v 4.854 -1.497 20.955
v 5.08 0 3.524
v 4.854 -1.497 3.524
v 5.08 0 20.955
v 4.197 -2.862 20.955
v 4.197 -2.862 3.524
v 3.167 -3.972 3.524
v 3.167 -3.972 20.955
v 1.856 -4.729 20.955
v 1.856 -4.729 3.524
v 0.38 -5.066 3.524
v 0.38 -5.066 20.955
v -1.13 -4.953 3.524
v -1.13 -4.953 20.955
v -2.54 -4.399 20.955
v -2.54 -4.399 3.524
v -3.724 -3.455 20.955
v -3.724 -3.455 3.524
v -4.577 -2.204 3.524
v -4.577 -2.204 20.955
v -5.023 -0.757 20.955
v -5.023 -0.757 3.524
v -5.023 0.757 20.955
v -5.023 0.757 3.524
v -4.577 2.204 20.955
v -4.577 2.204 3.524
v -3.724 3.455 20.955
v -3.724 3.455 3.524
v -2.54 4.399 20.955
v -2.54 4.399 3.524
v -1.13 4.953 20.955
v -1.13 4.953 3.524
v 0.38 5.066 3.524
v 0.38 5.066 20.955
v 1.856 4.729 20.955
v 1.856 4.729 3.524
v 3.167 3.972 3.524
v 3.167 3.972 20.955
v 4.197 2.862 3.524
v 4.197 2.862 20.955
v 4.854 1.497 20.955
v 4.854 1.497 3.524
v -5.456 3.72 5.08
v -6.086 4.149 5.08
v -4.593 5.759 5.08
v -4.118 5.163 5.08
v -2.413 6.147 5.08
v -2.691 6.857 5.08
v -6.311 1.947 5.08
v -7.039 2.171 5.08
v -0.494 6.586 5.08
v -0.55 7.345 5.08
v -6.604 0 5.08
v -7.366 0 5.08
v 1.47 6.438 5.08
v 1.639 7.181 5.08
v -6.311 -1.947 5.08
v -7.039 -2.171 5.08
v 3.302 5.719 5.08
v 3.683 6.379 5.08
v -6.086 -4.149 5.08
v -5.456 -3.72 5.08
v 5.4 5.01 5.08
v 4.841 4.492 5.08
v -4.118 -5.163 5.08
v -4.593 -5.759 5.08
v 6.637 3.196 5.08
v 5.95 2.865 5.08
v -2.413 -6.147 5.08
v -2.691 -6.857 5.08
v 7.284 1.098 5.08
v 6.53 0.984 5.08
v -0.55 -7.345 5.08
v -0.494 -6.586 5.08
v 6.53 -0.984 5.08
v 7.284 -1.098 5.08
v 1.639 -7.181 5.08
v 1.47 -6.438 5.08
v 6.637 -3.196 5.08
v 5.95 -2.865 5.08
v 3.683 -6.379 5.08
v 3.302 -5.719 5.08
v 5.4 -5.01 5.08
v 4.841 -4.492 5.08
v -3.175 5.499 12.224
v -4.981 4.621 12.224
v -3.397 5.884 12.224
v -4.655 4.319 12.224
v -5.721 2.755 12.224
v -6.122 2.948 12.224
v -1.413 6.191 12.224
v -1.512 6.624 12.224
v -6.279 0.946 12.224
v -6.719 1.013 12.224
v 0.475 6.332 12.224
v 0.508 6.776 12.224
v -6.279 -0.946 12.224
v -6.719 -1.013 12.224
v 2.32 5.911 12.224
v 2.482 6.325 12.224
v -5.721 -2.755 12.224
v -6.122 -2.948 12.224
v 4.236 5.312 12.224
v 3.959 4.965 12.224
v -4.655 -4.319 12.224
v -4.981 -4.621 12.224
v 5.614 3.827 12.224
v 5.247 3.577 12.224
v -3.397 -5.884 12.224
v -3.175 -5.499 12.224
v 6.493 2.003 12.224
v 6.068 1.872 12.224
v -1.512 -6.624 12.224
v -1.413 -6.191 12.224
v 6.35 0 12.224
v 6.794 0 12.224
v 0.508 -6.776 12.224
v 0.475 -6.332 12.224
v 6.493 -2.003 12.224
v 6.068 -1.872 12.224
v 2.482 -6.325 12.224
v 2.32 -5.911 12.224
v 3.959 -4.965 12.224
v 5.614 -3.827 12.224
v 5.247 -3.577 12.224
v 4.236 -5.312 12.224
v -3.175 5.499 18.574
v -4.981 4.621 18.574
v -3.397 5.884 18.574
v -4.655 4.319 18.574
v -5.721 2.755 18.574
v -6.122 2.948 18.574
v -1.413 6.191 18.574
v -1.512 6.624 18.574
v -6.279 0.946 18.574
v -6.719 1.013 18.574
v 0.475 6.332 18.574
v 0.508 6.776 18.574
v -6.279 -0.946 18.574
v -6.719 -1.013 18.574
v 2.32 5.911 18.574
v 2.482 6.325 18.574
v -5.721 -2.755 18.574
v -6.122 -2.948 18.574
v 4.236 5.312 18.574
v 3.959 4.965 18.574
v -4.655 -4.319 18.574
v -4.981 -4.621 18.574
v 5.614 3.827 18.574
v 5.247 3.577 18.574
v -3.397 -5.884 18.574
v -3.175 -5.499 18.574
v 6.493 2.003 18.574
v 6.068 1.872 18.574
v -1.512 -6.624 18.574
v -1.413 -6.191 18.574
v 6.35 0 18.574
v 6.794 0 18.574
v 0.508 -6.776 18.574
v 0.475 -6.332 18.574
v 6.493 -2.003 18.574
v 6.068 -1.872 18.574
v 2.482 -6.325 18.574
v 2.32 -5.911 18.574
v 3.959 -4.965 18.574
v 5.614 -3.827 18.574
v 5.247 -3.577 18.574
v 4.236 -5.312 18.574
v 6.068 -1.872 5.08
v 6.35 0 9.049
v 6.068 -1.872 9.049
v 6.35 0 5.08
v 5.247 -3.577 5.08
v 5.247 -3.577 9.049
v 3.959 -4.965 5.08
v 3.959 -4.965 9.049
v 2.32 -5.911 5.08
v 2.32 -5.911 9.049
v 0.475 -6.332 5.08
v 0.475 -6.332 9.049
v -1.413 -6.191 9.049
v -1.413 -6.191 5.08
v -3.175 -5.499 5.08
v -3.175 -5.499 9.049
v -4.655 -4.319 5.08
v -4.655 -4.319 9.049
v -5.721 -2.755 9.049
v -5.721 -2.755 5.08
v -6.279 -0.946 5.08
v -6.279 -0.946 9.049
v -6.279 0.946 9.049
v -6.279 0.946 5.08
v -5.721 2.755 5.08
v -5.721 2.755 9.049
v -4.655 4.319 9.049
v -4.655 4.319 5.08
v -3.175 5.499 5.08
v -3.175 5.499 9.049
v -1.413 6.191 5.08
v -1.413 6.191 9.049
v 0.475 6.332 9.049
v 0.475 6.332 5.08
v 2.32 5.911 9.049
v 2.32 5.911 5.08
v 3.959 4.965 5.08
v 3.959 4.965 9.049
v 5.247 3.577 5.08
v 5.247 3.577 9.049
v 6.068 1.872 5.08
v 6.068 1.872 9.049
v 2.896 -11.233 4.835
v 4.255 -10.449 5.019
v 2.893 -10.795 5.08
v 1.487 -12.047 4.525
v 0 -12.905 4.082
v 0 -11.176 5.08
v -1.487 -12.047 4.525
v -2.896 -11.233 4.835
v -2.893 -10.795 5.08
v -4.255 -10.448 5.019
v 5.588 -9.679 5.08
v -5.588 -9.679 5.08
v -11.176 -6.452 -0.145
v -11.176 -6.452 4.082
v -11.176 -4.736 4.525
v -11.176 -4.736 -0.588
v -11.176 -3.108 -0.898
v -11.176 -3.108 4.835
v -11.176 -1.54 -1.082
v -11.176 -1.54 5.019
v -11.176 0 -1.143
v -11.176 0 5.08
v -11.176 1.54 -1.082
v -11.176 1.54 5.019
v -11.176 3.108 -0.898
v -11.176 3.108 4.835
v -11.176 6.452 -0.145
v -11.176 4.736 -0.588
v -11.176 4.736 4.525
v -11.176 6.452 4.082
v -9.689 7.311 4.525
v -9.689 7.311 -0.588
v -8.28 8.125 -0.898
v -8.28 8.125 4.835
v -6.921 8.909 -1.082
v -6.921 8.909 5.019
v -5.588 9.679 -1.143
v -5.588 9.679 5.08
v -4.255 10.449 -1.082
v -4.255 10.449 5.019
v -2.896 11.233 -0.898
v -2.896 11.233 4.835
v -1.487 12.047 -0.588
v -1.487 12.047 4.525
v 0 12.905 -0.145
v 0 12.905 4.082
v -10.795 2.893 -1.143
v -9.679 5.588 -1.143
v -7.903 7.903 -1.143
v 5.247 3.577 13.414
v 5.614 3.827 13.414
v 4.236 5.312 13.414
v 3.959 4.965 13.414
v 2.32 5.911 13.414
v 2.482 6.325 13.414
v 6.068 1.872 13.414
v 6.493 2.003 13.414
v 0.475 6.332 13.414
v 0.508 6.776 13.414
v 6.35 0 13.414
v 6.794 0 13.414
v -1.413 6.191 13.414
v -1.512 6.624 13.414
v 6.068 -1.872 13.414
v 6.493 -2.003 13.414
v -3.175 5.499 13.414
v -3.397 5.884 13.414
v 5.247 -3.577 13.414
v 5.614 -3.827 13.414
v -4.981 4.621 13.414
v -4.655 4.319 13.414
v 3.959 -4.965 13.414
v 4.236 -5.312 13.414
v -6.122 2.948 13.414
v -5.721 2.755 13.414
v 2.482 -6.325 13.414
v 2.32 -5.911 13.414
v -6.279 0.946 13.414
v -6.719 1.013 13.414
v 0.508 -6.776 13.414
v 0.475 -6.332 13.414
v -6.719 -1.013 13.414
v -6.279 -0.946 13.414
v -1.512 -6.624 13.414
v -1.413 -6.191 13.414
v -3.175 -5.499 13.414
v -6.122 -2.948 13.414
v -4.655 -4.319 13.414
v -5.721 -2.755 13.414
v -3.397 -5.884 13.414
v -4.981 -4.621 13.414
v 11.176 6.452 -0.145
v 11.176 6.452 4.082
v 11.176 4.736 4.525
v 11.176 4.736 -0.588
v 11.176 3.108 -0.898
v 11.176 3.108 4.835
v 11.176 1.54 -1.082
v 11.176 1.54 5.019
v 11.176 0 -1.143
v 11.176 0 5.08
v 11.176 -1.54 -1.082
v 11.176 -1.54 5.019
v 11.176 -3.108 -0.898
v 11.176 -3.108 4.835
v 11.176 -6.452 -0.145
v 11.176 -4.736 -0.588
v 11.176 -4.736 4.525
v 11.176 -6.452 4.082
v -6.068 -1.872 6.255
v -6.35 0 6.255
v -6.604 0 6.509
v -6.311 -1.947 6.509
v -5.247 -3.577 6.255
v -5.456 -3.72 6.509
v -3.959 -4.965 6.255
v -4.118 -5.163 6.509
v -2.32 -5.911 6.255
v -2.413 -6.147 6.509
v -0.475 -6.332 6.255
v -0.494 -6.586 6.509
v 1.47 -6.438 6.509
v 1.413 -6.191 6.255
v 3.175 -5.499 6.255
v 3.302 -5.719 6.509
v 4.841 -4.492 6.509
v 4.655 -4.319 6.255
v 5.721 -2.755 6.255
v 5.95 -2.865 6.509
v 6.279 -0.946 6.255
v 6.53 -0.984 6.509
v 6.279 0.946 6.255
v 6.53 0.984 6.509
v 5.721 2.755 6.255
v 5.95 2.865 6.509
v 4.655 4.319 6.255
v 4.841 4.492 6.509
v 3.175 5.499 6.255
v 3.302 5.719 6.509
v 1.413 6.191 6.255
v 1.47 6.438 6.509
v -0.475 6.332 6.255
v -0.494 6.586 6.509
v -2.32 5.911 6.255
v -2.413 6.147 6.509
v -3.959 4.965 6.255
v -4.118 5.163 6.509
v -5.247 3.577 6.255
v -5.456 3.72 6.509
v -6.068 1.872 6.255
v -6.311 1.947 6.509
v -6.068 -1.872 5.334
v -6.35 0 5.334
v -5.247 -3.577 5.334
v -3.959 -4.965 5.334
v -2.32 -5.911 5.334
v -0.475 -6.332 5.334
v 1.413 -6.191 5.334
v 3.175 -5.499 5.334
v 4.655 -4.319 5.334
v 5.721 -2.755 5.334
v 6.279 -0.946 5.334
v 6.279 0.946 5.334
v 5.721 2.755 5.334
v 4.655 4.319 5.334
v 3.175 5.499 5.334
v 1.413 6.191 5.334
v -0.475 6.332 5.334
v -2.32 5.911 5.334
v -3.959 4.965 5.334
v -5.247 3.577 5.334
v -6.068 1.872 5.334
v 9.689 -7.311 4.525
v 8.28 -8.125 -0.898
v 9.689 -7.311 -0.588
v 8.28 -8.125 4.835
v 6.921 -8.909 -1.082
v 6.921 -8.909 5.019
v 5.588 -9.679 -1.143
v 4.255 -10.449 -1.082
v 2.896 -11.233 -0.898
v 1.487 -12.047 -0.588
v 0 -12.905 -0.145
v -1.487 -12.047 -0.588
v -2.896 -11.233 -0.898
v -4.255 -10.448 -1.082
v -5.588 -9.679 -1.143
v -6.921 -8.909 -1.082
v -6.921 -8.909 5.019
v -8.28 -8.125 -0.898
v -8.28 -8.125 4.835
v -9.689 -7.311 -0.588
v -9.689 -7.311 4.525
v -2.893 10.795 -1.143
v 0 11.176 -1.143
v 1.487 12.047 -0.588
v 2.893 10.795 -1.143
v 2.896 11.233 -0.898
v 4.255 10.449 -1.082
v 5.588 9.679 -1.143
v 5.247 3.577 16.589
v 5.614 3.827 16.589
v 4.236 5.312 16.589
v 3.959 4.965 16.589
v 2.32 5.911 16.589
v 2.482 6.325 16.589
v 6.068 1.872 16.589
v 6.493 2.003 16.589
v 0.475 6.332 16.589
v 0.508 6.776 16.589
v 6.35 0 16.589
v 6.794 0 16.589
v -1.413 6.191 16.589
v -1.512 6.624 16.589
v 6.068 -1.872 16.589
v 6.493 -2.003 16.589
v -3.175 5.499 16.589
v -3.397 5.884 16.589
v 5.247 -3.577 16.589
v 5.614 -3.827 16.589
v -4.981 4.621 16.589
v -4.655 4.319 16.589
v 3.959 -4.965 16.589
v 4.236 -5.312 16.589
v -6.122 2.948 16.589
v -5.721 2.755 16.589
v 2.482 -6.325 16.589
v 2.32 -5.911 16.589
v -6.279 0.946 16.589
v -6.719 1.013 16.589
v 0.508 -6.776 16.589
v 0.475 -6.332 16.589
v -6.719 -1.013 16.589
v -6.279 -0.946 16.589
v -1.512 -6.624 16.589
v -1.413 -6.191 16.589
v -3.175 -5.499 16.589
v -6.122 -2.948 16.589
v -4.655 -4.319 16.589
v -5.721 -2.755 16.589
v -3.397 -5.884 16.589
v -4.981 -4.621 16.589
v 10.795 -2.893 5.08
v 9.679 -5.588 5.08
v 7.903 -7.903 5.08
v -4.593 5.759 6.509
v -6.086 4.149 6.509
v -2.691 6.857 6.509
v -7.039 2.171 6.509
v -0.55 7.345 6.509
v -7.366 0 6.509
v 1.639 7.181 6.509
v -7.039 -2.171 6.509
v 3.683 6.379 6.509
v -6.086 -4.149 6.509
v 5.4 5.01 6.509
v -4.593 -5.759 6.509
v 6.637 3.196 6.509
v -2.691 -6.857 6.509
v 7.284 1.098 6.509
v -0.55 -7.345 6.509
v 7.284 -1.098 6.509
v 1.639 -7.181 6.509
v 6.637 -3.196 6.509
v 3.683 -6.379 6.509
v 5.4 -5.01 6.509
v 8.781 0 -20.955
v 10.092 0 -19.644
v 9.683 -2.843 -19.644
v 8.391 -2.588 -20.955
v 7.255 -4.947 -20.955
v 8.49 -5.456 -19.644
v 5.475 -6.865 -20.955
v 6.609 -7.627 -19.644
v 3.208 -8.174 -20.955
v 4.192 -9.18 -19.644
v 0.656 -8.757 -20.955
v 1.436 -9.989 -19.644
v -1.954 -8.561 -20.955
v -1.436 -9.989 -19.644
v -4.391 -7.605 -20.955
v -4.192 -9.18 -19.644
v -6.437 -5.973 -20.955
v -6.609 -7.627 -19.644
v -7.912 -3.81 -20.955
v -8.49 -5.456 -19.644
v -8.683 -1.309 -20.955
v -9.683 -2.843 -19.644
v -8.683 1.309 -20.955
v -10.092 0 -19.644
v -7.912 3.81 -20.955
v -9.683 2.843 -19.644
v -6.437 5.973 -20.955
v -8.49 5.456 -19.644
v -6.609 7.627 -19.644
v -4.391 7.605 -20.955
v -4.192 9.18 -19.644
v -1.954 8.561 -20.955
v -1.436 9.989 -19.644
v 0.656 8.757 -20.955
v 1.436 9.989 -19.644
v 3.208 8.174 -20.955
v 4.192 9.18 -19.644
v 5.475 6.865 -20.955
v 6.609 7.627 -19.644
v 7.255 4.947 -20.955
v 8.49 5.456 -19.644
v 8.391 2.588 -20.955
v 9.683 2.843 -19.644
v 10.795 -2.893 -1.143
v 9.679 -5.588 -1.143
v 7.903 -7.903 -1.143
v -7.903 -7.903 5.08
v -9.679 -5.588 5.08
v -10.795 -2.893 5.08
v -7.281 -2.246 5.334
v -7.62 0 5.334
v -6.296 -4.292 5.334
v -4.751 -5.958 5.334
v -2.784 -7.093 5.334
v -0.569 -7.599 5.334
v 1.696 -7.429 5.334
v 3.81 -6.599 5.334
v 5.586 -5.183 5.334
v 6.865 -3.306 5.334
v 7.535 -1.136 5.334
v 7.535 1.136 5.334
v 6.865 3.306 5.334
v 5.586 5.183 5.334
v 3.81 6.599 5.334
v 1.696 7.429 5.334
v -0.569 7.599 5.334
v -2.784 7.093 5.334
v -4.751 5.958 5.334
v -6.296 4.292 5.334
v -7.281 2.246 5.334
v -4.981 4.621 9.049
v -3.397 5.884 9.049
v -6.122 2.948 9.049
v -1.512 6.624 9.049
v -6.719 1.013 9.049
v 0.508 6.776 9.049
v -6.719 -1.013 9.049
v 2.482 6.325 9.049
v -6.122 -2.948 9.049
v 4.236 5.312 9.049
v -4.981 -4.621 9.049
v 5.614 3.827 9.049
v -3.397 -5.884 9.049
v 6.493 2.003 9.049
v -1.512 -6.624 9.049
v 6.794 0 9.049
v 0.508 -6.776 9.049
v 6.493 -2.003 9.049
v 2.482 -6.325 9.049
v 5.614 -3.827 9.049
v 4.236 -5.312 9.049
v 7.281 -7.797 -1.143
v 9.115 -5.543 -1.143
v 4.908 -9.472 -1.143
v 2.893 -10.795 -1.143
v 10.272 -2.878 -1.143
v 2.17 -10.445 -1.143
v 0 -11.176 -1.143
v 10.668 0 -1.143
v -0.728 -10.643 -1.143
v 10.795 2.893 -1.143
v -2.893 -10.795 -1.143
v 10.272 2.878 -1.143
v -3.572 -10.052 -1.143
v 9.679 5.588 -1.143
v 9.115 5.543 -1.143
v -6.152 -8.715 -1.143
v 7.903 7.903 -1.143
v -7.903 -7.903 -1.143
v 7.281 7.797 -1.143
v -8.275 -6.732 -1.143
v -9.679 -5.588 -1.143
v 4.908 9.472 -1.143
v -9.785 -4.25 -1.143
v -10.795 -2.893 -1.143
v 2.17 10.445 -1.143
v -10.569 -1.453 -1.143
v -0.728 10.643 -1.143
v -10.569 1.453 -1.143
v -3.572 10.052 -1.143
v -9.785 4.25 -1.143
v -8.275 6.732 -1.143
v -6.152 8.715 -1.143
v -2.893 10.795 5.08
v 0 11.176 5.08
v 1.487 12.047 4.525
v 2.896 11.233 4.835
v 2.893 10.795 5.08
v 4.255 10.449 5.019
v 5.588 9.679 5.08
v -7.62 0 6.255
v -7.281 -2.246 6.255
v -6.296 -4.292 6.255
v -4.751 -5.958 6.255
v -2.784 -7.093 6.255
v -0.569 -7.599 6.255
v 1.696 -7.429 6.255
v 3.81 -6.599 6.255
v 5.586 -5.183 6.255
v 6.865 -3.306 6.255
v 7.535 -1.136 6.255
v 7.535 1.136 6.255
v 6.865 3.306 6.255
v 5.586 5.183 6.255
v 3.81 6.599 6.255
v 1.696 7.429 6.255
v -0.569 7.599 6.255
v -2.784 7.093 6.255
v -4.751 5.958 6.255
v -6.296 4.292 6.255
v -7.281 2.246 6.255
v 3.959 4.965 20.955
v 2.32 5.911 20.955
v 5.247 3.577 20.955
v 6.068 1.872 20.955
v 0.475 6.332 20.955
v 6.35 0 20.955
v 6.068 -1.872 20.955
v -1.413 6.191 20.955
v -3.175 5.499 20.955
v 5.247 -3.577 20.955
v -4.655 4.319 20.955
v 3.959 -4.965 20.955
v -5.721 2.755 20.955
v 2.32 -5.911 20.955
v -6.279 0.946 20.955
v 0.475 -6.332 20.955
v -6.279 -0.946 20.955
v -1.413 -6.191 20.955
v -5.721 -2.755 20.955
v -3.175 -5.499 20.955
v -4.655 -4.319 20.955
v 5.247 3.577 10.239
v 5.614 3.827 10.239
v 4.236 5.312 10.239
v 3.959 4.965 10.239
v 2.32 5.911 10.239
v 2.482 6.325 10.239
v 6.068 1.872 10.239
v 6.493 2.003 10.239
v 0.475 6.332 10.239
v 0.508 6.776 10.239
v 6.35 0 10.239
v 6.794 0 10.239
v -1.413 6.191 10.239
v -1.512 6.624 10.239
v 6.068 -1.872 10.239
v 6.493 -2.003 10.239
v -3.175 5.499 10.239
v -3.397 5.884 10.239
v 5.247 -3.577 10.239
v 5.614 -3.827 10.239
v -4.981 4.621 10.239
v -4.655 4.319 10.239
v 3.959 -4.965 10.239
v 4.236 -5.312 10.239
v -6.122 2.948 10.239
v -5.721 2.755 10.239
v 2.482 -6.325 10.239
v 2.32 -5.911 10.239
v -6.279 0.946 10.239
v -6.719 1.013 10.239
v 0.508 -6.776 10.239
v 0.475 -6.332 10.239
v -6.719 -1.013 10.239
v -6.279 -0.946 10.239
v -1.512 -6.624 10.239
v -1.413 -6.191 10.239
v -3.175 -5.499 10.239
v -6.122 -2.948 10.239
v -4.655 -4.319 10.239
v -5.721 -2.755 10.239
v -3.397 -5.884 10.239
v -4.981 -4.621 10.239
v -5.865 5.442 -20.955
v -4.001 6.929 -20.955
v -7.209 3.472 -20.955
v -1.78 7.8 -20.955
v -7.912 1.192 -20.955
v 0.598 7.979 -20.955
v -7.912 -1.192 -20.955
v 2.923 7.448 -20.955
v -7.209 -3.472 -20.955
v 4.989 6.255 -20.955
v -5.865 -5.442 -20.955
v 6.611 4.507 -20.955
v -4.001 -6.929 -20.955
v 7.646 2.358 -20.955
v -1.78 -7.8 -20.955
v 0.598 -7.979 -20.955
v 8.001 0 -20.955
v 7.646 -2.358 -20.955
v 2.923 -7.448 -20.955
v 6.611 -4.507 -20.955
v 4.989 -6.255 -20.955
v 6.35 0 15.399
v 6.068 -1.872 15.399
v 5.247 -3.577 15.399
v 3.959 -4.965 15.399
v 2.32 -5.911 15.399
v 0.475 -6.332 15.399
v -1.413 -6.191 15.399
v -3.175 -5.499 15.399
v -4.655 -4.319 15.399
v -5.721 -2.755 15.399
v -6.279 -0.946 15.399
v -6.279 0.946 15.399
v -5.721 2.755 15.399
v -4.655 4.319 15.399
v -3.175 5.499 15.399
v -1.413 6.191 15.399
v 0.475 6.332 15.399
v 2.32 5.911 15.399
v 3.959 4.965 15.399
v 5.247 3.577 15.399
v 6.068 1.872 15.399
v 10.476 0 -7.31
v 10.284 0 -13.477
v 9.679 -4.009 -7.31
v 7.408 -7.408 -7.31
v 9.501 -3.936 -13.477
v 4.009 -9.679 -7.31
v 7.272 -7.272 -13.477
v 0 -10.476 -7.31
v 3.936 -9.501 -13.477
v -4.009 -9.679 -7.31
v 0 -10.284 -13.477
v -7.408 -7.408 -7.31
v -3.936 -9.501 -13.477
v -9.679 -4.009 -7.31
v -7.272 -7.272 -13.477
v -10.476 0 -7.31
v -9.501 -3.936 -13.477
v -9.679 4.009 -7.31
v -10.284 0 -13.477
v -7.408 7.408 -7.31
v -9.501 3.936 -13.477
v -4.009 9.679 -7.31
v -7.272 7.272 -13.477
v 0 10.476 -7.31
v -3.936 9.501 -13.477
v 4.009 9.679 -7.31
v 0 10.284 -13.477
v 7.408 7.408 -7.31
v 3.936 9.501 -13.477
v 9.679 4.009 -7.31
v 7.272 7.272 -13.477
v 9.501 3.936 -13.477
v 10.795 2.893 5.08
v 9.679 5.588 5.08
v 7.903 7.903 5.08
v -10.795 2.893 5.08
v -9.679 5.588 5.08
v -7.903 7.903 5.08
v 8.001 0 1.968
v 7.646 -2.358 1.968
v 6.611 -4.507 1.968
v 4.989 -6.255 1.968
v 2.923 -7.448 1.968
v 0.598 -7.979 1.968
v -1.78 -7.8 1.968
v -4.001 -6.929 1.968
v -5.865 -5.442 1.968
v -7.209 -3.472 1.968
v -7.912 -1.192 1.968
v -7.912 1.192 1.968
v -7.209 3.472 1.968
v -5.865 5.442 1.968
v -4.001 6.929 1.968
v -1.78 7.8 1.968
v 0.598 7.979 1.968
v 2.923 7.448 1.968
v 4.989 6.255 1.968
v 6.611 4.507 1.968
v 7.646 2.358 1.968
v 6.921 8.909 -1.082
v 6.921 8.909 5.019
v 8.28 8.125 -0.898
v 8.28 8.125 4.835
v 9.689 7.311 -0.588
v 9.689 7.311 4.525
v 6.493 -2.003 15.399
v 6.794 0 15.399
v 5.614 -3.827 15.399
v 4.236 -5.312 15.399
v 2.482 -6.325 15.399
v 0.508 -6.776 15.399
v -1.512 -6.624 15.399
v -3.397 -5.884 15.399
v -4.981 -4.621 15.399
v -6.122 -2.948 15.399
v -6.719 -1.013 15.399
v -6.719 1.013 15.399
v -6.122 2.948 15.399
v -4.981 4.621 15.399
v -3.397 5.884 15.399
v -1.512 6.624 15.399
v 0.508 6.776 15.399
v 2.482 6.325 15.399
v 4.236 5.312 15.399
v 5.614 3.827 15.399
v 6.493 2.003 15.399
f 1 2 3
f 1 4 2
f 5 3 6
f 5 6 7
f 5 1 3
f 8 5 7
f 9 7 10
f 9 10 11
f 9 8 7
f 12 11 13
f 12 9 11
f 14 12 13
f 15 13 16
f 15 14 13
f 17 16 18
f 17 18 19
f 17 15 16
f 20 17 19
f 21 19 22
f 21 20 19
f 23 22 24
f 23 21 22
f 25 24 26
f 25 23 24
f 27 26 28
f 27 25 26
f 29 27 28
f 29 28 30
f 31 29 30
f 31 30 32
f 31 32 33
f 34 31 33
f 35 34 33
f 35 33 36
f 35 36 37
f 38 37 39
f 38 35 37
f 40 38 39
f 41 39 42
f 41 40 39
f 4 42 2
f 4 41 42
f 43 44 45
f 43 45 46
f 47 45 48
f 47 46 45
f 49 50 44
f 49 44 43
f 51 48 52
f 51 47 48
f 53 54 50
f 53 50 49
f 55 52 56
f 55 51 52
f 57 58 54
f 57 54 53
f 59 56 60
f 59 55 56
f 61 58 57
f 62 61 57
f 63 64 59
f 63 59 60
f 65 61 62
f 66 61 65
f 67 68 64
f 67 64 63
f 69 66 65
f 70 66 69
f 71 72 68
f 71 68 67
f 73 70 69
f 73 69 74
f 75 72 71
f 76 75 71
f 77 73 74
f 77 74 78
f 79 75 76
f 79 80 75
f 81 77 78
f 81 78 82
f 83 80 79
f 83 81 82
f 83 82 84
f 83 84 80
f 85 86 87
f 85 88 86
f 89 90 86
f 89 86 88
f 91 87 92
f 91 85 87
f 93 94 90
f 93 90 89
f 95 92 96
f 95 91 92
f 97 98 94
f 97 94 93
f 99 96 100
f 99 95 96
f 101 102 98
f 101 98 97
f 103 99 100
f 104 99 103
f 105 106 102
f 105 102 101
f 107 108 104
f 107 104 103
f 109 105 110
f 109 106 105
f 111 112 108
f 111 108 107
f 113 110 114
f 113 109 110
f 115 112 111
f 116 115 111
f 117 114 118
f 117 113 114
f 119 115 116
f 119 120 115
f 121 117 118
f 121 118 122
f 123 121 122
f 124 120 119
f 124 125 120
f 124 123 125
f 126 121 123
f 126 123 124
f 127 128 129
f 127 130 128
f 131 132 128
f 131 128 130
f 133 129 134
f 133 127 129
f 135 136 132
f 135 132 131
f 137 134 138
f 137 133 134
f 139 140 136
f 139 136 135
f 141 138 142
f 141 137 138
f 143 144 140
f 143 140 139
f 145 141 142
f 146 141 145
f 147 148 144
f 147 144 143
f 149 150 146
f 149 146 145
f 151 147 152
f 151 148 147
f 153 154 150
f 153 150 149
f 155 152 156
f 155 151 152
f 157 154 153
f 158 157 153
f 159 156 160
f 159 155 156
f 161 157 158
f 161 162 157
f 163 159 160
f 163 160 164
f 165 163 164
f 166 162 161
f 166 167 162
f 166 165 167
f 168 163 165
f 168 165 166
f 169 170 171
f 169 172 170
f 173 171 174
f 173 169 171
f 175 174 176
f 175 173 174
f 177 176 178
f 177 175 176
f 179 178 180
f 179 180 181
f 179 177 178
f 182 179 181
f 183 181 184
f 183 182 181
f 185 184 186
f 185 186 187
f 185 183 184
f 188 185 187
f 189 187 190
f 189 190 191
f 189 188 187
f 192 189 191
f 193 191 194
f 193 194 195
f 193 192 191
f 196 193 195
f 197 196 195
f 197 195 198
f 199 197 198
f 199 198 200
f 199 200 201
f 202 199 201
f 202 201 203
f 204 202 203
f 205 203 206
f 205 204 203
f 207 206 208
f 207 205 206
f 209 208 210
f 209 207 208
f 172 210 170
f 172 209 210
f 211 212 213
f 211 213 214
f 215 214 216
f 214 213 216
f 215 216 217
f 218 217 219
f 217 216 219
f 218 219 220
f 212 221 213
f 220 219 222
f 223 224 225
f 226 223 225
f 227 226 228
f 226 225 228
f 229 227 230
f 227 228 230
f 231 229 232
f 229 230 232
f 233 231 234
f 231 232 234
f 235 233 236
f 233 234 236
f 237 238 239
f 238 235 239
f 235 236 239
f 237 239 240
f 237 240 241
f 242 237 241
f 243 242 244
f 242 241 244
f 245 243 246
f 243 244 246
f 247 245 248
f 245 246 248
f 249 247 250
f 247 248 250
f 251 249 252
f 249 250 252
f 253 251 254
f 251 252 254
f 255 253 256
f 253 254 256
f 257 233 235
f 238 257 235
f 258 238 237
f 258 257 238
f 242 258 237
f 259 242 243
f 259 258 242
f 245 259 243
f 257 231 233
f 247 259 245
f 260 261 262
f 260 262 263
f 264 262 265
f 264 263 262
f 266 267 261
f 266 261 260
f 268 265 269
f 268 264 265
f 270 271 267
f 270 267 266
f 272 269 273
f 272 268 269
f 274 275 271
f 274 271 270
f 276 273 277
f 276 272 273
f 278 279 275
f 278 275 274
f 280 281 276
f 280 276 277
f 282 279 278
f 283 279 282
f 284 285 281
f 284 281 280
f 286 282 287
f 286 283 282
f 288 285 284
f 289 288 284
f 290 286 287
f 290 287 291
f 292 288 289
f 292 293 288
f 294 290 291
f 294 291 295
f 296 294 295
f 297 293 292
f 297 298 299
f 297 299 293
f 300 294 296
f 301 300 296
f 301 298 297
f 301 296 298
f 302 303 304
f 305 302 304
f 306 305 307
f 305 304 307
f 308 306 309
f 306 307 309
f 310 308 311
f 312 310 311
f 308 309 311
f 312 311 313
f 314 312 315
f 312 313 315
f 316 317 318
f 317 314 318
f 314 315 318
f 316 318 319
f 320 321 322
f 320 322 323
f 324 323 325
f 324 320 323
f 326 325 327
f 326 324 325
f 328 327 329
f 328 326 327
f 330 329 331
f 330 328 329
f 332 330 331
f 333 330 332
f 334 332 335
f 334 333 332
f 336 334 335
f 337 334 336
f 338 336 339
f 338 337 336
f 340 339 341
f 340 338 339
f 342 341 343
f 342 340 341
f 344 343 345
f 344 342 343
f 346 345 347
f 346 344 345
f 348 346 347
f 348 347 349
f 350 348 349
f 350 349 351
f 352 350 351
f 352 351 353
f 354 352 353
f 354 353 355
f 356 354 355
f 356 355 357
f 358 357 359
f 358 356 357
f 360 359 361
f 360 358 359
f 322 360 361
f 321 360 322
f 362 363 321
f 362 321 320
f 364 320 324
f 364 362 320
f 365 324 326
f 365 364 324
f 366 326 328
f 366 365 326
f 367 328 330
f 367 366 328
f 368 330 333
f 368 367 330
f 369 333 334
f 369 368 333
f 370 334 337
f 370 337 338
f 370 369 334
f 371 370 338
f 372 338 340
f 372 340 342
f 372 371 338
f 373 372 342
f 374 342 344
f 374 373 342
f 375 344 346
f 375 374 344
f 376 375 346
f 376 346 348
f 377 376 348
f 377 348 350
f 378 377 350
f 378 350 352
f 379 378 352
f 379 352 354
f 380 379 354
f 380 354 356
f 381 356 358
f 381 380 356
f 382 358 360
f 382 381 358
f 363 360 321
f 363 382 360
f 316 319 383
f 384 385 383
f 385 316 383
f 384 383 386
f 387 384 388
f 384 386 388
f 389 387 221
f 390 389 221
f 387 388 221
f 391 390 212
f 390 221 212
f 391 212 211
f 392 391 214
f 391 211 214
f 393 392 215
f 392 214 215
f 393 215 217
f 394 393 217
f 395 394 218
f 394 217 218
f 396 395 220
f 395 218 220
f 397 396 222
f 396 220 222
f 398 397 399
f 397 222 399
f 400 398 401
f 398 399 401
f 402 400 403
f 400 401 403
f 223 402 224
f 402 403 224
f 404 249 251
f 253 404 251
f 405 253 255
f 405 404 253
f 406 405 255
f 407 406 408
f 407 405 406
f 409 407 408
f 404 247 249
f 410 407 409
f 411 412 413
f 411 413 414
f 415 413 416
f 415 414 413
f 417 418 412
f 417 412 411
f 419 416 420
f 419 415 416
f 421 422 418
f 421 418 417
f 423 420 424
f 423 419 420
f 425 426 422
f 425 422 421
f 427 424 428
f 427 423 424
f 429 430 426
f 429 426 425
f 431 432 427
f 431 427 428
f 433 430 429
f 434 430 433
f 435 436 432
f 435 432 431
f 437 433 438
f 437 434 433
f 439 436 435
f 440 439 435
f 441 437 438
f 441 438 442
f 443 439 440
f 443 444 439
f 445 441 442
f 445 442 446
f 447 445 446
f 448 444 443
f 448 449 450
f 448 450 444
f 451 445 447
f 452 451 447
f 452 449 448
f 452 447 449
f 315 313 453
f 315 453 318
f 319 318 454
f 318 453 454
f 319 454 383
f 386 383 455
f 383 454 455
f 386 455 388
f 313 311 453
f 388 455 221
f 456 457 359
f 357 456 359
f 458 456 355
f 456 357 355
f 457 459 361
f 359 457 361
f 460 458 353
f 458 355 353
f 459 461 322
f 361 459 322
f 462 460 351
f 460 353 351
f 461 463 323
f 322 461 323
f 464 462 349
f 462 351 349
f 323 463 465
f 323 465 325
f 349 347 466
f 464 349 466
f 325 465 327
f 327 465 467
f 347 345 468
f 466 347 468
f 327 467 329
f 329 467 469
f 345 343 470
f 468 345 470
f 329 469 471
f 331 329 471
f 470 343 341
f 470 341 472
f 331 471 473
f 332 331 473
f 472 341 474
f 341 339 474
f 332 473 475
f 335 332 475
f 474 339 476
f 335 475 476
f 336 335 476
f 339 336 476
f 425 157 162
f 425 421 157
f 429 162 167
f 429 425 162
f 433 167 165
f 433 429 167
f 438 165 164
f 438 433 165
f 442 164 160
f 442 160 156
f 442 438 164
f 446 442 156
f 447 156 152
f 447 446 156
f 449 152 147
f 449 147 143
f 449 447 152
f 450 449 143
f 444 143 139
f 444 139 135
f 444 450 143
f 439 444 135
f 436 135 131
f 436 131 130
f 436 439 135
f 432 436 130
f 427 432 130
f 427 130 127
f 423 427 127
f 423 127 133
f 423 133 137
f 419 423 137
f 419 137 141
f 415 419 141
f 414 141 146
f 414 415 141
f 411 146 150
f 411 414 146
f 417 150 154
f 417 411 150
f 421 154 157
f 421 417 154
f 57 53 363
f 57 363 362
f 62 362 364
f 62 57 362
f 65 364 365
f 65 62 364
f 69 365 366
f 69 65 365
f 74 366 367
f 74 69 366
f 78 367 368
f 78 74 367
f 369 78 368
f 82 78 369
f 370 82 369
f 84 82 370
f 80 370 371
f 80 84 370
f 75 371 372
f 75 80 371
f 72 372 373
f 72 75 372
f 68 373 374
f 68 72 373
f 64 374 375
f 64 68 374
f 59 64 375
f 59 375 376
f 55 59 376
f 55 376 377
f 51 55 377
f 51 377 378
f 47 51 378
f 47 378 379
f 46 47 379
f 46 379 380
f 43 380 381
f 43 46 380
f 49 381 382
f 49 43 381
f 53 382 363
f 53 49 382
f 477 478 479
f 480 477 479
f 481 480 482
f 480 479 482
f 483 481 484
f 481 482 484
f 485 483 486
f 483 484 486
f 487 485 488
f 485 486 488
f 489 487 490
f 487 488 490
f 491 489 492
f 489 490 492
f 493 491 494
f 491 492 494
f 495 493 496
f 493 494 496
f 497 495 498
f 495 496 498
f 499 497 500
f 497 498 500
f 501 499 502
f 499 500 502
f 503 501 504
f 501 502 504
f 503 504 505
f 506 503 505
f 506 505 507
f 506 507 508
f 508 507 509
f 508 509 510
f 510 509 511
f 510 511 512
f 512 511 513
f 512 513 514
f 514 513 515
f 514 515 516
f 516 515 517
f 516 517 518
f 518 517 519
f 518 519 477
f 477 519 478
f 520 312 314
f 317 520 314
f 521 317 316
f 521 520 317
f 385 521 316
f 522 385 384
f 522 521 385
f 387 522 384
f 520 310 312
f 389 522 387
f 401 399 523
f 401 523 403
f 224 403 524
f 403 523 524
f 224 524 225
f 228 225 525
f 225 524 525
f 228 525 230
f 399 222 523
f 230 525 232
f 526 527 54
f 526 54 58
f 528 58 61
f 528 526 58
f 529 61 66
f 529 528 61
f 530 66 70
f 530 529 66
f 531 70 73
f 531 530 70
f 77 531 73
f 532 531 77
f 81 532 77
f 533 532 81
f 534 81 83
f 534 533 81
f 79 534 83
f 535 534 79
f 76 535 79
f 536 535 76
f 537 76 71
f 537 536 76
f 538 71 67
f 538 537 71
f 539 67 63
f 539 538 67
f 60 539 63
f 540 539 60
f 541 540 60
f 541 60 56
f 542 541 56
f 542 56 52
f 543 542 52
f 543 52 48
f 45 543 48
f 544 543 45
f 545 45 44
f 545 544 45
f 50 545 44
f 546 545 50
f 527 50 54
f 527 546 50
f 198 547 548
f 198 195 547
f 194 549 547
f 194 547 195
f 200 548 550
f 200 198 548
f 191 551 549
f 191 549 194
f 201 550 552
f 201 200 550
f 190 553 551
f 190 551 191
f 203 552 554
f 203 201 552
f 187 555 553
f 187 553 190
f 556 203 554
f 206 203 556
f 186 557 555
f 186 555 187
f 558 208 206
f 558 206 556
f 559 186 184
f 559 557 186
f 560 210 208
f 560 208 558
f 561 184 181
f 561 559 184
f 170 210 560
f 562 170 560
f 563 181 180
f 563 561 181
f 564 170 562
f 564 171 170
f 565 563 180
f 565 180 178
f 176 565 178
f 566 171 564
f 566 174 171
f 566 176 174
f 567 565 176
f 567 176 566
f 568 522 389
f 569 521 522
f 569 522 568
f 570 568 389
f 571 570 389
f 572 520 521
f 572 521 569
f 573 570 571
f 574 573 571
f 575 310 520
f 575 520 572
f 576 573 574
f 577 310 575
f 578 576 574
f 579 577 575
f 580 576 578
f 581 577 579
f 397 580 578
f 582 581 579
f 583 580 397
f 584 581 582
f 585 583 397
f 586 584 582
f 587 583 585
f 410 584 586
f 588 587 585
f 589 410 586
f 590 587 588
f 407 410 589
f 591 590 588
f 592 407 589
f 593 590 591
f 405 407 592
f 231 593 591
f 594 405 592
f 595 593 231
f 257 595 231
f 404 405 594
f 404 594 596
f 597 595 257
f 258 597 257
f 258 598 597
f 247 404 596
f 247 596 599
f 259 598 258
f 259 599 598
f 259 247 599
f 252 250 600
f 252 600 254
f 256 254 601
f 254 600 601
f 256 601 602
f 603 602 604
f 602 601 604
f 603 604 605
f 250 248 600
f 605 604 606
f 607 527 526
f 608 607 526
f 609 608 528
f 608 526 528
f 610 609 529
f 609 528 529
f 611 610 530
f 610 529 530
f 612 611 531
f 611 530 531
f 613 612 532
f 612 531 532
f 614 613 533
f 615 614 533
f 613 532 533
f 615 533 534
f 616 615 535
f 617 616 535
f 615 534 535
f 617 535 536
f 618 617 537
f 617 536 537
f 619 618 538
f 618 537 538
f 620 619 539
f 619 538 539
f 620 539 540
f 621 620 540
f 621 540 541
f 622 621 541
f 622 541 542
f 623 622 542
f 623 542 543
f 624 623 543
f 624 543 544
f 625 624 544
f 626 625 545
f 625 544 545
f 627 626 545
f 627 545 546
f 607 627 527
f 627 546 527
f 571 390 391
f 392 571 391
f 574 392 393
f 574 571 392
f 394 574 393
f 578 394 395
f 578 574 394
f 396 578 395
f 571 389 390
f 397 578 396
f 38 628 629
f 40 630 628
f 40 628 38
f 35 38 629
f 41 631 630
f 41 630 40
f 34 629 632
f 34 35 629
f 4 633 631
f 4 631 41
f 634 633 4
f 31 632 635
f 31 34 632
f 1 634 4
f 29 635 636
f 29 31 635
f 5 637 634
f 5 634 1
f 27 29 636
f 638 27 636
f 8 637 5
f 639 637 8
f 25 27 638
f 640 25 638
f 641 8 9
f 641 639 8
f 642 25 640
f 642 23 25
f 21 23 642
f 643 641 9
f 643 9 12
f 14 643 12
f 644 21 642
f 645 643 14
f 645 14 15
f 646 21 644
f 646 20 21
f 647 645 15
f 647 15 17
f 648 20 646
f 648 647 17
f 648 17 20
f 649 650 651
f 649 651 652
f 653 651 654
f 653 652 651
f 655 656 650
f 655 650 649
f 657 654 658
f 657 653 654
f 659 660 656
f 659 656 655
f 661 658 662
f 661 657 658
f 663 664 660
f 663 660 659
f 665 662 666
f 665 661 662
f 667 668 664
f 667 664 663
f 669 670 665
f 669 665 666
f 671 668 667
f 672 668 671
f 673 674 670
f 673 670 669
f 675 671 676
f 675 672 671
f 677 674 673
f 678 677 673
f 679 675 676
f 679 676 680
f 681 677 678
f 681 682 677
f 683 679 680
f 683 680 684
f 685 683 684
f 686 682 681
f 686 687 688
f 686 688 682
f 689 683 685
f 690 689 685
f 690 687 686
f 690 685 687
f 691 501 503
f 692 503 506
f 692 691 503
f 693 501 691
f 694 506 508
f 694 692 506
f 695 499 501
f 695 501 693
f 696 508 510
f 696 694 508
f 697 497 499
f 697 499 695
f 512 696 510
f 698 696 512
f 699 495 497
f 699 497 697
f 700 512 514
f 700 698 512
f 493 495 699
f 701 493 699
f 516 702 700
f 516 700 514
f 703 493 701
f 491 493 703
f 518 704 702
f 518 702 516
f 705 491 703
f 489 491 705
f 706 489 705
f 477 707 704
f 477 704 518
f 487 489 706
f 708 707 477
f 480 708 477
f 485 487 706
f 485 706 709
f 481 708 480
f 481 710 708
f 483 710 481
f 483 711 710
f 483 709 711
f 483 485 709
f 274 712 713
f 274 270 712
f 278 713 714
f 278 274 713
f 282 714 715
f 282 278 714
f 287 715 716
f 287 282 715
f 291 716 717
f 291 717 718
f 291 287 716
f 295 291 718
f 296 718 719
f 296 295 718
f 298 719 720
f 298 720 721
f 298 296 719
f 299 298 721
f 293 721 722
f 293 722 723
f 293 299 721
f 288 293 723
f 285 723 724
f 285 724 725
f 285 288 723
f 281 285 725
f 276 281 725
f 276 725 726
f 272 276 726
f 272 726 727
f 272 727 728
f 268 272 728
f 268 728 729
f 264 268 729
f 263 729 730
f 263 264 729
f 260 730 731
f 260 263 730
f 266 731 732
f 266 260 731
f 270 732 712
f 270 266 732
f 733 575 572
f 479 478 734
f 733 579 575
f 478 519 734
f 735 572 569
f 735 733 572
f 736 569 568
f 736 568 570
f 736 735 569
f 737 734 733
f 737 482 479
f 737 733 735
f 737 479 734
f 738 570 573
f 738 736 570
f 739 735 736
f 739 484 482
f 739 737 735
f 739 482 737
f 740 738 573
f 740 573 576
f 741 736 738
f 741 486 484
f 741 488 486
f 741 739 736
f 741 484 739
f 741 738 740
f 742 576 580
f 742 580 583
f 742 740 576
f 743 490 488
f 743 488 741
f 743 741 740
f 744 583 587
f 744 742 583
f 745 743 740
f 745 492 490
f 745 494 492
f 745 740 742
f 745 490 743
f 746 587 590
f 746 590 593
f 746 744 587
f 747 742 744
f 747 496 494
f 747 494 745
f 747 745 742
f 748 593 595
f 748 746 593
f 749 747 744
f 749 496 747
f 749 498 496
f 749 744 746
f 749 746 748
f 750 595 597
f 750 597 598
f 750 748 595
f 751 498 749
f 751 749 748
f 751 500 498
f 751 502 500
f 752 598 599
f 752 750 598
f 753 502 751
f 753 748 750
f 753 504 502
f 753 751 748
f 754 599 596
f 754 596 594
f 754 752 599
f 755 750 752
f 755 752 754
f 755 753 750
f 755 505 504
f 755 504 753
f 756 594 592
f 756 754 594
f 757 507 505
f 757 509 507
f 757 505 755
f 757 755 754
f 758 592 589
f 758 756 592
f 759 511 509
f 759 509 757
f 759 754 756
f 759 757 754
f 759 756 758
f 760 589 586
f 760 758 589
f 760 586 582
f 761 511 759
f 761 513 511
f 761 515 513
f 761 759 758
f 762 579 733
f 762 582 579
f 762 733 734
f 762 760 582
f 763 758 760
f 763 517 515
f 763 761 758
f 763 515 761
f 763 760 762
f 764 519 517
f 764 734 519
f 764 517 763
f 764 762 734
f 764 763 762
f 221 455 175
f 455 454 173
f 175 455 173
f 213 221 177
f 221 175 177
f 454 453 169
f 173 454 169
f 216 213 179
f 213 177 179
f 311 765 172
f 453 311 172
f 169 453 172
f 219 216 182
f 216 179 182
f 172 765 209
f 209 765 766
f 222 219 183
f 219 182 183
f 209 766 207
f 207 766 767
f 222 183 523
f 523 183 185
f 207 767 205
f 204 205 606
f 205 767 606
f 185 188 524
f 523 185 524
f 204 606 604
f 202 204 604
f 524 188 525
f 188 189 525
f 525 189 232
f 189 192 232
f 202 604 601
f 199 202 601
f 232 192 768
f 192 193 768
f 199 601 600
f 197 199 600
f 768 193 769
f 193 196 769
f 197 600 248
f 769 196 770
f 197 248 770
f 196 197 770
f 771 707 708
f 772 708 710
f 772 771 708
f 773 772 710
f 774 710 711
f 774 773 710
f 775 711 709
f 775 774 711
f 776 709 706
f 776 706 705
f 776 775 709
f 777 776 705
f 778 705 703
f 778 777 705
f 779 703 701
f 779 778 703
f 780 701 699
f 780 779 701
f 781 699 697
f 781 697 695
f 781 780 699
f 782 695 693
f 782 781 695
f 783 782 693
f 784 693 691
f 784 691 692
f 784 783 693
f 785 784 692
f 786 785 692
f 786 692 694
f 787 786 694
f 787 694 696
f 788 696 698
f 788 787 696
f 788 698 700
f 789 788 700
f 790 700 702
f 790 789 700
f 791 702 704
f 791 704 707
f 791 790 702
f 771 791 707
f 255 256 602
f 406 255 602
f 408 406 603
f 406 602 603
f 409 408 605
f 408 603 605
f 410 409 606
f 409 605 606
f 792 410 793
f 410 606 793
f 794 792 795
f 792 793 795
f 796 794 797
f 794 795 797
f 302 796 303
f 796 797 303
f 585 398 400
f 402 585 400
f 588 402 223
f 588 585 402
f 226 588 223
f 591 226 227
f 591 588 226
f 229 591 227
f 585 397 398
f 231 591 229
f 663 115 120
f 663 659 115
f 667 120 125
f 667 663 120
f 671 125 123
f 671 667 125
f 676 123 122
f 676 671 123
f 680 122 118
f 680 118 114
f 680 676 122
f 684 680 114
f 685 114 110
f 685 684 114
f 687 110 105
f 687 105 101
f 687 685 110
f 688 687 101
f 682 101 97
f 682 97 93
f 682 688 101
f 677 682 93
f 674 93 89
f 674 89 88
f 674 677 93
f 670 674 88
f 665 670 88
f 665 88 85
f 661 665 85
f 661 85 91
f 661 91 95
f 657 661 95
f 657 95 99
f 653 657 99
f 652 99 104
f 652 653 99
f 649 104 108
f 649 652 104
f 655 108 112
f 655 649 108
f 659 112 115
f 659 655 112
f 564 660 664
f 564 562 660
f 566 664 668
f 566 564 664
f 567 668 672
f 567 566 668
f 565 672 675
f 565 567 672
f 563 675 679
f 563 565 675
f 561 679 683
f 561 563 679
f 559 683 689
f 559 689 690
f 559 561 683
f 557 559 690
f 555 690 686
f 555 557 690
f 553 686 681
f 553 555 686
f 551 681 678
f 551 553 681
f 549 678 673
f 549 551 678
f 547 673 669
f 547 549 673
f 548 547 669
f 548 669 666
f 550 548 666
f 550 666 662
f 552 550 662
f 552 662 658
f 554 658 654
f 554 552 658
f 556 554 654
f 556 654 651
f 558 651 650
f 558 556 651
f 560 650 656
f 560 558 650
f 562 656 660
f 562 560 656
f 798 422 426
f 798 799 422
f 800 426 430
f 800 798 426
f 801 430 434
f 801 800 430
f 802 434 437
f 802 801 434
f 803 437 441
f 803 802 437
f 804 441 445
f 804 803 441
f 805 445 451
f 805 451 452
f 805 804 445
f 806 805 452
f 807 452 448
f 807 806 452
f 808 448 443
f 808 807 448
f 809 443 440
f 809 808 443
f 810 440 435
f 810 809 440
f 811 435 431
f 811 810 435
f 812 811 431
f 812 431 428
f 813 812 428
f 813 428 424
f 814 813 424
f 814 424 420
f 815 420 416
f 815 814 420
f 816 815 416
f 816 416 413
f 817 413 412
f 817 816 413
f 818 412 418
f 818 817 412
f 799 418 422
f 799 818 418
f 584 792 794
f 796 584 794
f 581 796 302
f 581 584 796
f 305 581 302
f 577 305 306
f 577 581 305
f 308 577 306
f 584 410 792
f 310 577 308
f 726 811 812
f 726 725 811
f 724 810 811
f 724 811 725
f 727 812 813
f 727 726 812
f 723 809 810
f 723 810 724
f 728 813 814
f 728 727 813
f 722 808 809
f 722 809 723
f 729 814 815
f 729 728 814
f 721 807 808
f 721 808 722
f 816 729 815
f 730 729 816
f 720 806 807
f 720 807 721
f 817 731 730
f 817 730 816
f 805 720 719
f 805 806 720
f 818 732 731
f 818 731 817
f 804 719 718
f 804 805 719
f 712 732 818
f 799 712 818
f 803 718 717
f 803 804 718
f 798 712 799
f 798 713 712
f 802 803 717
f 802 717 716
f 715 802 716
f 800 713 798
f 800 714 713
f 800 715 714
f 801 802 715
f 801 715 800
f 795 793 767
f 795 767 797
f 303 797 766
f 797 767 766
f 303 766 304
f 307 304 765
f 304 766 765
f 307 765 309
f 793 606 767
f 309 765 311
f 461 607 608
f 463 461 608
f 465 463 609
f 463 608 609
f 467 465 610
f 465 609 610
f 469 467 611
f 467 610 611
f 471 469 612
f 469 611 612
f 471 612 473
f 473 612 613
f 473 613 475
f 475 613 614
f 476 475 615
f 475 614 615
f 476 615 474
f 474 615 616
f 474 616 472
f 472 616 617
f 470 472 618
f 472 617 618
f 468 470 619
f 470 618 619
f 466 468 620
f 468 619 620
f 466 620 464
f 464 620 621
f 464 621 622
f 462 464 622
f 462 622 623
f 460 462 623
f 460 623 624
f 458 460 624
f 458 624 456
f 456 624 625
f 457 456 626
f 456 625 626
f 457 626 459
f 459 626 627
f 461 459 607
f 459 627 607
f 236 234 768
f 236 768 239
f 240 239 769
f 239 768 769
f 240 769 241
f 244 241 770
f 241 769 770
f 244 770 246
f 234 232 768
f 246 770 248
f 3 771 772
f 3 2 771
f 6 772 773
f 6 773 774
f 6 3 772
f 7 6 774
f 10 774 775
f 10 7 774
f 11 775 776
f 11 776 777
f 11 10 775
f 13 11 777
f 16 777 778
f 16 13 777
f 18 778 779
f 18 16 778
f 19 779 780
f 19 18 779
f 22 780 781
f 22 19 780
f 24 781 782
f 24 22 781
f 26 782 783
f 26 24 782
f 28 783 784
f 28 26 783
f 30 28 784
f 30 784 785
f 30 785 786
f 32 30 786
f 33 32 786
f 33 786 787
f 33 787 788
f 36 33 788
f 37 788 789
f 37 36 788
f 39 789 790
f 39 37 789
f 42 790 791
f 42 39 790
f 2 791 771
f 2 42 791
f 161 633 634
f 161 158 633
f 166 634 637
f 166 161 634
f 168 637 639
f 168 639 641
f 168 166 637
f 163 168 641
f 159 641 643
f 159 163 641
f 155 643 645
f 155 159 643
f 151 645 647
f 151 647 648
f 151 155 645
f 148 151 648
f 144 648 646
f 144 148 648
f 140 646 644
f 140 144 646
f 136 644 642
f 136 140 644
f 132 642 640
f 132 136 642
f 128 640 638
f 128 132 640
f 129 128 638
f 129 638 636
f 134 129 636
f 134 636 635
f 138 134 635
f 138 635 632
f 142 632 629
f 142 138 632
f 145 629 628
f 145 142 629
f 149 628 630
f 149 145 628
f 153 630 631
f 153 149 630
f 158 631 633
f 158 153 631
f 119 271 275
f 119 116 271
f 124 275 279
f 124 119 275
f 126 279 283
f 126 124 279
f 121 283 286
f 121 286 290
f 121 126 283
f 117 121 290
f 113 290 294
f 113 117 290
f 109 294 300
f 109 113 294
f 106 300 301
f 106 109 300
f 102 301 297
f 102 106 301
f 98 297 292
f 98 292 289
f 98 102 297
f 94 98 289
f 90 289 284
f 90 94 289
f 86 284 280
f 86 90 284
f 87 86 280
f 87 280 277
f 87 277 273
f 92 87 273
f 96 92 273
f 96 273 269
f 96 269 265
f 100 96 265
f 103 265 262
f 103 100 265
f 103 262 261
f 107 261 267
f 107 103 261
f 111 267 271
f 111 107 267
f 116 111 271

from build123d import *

# Parameters (mm, degrees)
SKETCH16_R          = 11.176
CUT_EXTRUDE4_DEPTH  = 28.168503014
CHAMFER1_SIZE       = 1.27
CHAMFER1_SIZE2      = 1.311447455
BOSS_EXTRUDE1_START = -6.223
SKETCH10_R          = 8.001
BOSS_EXTRUDE1_DEPTH = 6.223
SKETCH11_OUTSIDE_W  = 135.36
SKETCH11_OUTSIDE_H  = 138.818
SKETCH11_OUTSIDE_R  = 11.176
CUT_EXTRUDE1_DEPTH  = 28.924216754
CUT_EXTRUDE1_DRAFT  = -60
SKETCH12_OUTSIDE_W  = 146.476
SKETCH12_OUTSIDE_H  = 149.934
SKETCH12_OUTSIDE_R  = 11.176
CUT_EXTRUDE2_DEPTH  = 32.132964882
CUT_EXTRUDE2_DRAFT  = 60
SKETCH18_W          = 1.42875
SKETCH18_H          = 1.27
CHAMFER2_SIZE       = 0.254


with BuildPart() as part:
    # Sketch1 → Revolve1 (revolve)
    with BuildSketch(Plane(origin=(0, 0, 0), x_dir=(0, 0, -1), z_dir=(1, 0, 0)), mode=Mode.PRIVATE) as revolve1_sk:
        Polygon((-18.57375, 6.35), (-16.589375, 6.35), (-16.589375, 6.7945), (-15.39875, 6.7945), (-15.39875, 6.35), (-13.414375, 6.35), (-13.414375, 6.7945), (-12.22375, 6.7945), (-12.22375, 6.35), (-10.239375, 6.35), (-10.239375, 6.7945), (-9.04875, 6.7945), (-9.04875, 6.35), (-5.08, 6.35), (-5.08, 11.176), (1.143, 11.176), (1.143, 10.668), (20.955, 10.051151533), (20.955, 8.001), (-1.9685, 8.001), (-3.52425, 5.08), (-20.955, 5.08), (-20.955, 6.35), (-18.57375, 6.7945), align=None)
    revolve(revolve1_sk.sketch.rotate(Axis((0, 0, 20.955), (0, 0, -1)), 90), axis=Axis((0, 0, 20.955), (0, 0, -1)))

    # Sketch16 → Cut-Extrude4 (cut, through all)
    with BuildSketch(Plane(origin=(0, 0, -1.143), x_dir=(-1, 0, 0), z_dir=(0, 0, -1))):
        with Locations(Location((0, 0, 0), (0, 0, 180))):
            Circle(SKETCH16_R)
    extrude(amount=CUT_EXTRUDE4_DEPTH, mode=Mode.SUBTRACT)

    # Sketch10 → Boss-Extrude1 (add)
    with BuildSketch(Plane(origin=(0, 0, -1.143), x_dir=(-1, 0, 0), z_dir=(0, 0, -1)).offset(BOSS_EXTRUDE1_START)):
        Polygon((11.176, 6.452466608), (0, 12.904933217), (-11.176, 6.452466608), (-11.176, -6.452466608), (0, -12.904933217), (11.176, -6.452466608), align=None)
        with Locations(Location((0, 0, 0), (0, 0, 180))):
            Circle(SKETCH10_R, mode=Mode.SUBTRACT)
    extrude(amount=BOSS_EXTRUDE1_DEPTH)


with BuildPart() as body_2:
    # Sketch17 → Revolve2 (revolve)
    with BuildSketch(Plane(origin=(0, 0, 0), x_dir=(0, 0, -1), z_dir=(1, 0, 0)), mode=Mode.PRIVATE) as revolve2_sk:
        Polygon((20.955, 8.001), (1.143, 8.001), (1.143, 10.668), (20.955, 10.051151533), align=None)
    revolve(revolve2_sk.sketch.rotate(Axis((0, 0, 20.955), (0, 0, -1)), 90), axis=Axis((0, 0, 20.955), (0, 0, -1)))

    # Chamfer1
    chamfer1_edges = [body_2.edges().sort_by_distance(p)[0] for p in [
        (-10.051151533, 0, -20.955),
    ]]
    chamfer1_side = [body_2.faces().sort_by_distance(p)[0] for p in [
        (-9.766862037, 0, -20.955),
    ]]
    chamfer(chamfer1_edges, length=CHAMFER1_SIZE, length2=CHAMFER1_SIZE2, reference=chamfer1_side[0])


with BuildPart() as cut_extrude1_tool:
    # Sketch11 outside → Cut-Extrude1 (with draft: the straight prism first)
    with BuildSketch(Plane(origin=(0, 0, -1.143), x_dir=(-1, 0, 0), z_dir=(0, 0, -1))):
        Rectangle(SKETCH11_OUTSIDE_W, SKETCH11_OUTSIDE_H)
        Circle(SKETCH11_OUTSIDE_R, mode=Mode.SUBTRACT)
    extrude(amount=-CUT_EXTRUDE1_DEPTH)
    # Cut-Extrude1: the draft: its side faces are tilted about the plane it starts from
    cut_extrude1_sides = [cut_extrude1_tool.faces().sort_by_distance(p)[0] for p in [
        (0, -69.409, 13.319108377),
        (-67.68, 0, 13.319108377),
        (0, 69.409, 13.319108377),
        (67.68, 0, 13.319108377),
        (11.176, 0, 13.319108377),
    ]]
    draft(cut_extrude1_sides, Plane(origin=(0, 0, -1.143), x_dir=(-1, 0, 0), z_dir=(0, 0, -1)), CUT_EXTRUDE1_DRAFT)


with BuildPart() as part_1:
    add(part.part)

    # Cut-Extrude1: cut by cut_extrude1_tool
    add(cut_extrude1_tool.part, mode=Mode.SUBTRACT)


with BuildPart() as cut_extrude2_tool:
    # Sketch12 outside → Cut-Extrude2 (with draft: the straight prism first)
    with BuildSketch(Plane(origin=(0, 0, 5.08), x_dir=(-1, 0, 0), z_dir=(0, 0, -1))):
        Rectangle(SKETCH12_OUTSIDE_W, SKETCH12_OUTSIDE_H)
        Circle(SKETCH12_OUTSIDE_R, mode=Mode.SUBTRACT)
    extrude(amount=CUT_EXTRUDE2_DEPTH)
    # Cut-Extrude2: the draft: its side faces are tilted about the plane it starts from
    cut_extrude2_sides = [cut_extrude2_tool.faces().sort_by_distance(p)[0] for p in [
        (0, -74.967, -10.986482441),
        (-73.238, 0, -10.986482441),
        (0, 74.967, -10.986482441),
        (73.238, 0, -10.986482441),
        (11.176, 0, -10.986482441),
    ]]
    draft(cut_extrude2_sides, Plane(origin=(0, 0, 5.08), x_dir=(-1, 0, 0), z_dir=(0, 0, -1)), CUT_EXTRUDE2_DRAFT)


with BuildPart() as part_2:
    add(part_1.part)

    # Cut-Extrude2: cut by cut_extrude2_tool
    add(cut_extrude2_tool.part, mode=Mode.SUBTRACT)

    # Combine1: union body 2
    add(body_2.part)


with BuildPart() as body_3:
    # Sketch18 → Revolve3 (revolve)
    with BuildSketch(Plane(origin=(0, 0, 0), x_dir=(0, 0, -1), z_dir=(1, 0, 0)), mode=Mode.PRIVATE) as revolve3_sk:
        with Locations((-5.794375, 6.985)):
            Rectangle(SKETCH18_W, SKETCH18_H)
    revolve(revolve3_sk.sketch.rotate(Axis((0, 0, 0), (0, 0, 1)), 90), axis=Axis((0, 0, 0), (0, 0, 1)))

    # Chamfer2
    chamfer2_edges = [body_3.edges().sort_by_distance(p)[0] for p in [
        (7.62, 0, 6.50875),
        (7.62, 0, 5.08),
        (6.35, 0, 5.08),
        (6.35, 0, 6.50875),
    ]]
    chamfer(chamfer2_edges, length=CHAMFER2_SIZE)


solid = Compound([part_2.part, body_3.part])
